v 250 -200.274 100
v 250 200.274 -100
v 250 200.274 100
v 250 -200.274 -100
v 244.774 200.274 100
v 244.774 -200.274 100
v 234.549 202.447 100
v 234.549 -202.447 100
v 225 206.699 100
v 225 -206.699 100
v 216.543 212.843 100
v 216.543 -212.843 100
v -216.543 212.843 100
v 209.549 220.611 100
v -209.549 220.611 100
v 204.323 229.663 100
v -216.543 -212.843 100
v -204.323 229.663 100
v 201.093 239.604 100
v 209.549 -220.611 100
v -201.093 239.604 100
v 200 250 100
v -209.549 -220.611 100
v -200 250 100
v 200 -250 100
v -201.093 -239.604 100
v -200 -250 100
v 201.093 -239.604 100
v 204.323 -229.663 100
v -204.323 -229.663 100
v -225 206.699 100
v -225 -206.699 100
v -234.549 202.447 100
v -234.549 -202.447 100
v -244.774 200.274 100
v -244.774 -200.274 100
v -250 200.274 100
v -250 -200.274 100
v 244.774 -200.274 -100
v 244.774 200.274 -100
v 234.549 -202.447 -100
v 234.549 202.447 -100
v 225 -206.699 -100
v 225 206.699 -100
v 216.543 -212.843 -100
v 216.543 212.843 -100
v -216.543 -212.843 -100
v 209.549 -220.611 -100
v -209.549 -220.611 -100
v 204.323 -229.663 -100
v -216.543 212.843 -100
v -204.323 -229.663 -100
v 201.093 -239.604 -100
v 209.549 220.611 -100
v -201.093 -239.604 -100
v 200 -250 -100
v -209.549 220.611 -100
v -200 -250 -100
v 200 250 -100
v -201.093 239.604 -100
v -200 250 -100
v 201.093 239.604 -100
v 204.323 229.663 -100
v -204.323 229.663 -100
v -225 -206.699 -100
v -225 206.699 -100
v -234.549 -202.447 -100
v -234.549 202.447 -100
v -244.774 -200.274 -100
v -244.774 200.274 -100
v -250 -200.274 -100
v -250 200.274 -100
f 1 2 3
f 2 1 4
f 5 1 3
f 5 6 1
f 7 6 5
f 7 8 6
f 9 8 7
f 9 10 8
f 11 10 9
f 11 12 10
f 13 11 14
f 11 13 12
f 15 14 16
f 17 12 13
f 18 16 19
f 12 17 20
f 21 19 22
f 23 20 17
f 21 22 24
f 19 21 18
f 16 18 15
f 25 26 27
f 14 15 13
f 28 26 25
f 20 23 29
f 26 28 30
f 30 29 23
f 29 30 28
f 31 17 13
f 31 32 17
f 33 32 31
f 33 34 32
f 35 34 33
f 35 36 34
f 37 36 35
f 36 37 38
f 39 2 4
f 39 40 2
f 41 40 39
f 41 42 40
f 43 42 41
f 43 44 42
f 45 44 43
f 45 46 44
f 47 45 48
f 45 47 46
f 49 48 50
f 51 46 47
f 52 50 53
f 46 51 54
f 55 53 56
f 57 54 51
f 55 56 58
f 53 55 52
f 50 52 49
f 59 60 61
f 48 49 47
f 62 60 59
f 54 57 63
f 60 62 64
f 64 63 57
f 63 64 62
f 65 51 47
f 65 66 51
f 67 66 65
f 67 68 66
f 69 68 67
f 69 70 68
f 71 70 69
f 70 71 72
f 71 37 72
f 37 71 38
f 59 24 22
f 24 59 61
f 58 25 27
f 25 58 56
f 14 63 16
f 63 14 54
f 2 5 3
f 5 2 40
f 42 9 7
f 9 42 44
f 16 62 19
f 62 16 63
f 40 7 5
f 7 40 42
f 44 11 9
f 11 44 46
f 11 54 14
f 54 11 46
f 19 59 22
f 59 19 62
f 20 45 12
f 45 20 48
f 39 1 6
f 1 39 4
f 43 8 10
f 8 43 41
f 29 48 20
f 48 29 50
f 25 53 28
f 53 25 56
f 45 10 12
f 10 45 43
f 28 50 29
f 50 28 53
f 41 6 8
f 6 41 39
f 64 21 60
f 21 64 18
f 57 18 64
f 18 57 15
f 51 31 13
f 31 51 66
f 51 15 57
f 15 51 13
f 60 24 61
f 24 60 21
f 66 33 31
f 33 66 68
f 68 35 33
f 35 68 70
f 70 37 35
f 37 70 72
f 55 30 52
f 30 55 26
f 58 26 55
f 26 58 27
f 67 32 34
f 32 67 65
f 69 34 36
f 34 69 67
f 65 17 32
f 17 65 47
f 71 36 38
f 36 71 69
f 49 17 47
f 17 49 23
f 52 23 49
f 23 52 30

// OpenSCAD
// InspectorBot Base Link Mesh

module base_link() {
    // Main body
    difference() {
        // Outer body
        union() {
            // Main rectangular body
            cube([500, 500, 200], center=true);
            
            // Slight rounding of edges
            minkowski() {
                cube([450, 450, 180], center=true);
                sphere(r=10, $fn=20);
            }
        }
        
        // Cutouts for propeller mounts
        translate([250, 250, 0]) 
            cylinder(h=220, r=50, center=true, $fn=30);
        
        translate([250, -250, 0]) 
            cylinder(h=220, r=50, center=true, $fn=30);
        
        translate([-250, 250, 0]) 
            cylinder(h=220, r=50, center=true, $fn=30);
        
        translate([-250, -250, 0]) 
            cylinder(h=220, r=50, center=true, $fn=30);
    }
}

// Render and export
base_link();
